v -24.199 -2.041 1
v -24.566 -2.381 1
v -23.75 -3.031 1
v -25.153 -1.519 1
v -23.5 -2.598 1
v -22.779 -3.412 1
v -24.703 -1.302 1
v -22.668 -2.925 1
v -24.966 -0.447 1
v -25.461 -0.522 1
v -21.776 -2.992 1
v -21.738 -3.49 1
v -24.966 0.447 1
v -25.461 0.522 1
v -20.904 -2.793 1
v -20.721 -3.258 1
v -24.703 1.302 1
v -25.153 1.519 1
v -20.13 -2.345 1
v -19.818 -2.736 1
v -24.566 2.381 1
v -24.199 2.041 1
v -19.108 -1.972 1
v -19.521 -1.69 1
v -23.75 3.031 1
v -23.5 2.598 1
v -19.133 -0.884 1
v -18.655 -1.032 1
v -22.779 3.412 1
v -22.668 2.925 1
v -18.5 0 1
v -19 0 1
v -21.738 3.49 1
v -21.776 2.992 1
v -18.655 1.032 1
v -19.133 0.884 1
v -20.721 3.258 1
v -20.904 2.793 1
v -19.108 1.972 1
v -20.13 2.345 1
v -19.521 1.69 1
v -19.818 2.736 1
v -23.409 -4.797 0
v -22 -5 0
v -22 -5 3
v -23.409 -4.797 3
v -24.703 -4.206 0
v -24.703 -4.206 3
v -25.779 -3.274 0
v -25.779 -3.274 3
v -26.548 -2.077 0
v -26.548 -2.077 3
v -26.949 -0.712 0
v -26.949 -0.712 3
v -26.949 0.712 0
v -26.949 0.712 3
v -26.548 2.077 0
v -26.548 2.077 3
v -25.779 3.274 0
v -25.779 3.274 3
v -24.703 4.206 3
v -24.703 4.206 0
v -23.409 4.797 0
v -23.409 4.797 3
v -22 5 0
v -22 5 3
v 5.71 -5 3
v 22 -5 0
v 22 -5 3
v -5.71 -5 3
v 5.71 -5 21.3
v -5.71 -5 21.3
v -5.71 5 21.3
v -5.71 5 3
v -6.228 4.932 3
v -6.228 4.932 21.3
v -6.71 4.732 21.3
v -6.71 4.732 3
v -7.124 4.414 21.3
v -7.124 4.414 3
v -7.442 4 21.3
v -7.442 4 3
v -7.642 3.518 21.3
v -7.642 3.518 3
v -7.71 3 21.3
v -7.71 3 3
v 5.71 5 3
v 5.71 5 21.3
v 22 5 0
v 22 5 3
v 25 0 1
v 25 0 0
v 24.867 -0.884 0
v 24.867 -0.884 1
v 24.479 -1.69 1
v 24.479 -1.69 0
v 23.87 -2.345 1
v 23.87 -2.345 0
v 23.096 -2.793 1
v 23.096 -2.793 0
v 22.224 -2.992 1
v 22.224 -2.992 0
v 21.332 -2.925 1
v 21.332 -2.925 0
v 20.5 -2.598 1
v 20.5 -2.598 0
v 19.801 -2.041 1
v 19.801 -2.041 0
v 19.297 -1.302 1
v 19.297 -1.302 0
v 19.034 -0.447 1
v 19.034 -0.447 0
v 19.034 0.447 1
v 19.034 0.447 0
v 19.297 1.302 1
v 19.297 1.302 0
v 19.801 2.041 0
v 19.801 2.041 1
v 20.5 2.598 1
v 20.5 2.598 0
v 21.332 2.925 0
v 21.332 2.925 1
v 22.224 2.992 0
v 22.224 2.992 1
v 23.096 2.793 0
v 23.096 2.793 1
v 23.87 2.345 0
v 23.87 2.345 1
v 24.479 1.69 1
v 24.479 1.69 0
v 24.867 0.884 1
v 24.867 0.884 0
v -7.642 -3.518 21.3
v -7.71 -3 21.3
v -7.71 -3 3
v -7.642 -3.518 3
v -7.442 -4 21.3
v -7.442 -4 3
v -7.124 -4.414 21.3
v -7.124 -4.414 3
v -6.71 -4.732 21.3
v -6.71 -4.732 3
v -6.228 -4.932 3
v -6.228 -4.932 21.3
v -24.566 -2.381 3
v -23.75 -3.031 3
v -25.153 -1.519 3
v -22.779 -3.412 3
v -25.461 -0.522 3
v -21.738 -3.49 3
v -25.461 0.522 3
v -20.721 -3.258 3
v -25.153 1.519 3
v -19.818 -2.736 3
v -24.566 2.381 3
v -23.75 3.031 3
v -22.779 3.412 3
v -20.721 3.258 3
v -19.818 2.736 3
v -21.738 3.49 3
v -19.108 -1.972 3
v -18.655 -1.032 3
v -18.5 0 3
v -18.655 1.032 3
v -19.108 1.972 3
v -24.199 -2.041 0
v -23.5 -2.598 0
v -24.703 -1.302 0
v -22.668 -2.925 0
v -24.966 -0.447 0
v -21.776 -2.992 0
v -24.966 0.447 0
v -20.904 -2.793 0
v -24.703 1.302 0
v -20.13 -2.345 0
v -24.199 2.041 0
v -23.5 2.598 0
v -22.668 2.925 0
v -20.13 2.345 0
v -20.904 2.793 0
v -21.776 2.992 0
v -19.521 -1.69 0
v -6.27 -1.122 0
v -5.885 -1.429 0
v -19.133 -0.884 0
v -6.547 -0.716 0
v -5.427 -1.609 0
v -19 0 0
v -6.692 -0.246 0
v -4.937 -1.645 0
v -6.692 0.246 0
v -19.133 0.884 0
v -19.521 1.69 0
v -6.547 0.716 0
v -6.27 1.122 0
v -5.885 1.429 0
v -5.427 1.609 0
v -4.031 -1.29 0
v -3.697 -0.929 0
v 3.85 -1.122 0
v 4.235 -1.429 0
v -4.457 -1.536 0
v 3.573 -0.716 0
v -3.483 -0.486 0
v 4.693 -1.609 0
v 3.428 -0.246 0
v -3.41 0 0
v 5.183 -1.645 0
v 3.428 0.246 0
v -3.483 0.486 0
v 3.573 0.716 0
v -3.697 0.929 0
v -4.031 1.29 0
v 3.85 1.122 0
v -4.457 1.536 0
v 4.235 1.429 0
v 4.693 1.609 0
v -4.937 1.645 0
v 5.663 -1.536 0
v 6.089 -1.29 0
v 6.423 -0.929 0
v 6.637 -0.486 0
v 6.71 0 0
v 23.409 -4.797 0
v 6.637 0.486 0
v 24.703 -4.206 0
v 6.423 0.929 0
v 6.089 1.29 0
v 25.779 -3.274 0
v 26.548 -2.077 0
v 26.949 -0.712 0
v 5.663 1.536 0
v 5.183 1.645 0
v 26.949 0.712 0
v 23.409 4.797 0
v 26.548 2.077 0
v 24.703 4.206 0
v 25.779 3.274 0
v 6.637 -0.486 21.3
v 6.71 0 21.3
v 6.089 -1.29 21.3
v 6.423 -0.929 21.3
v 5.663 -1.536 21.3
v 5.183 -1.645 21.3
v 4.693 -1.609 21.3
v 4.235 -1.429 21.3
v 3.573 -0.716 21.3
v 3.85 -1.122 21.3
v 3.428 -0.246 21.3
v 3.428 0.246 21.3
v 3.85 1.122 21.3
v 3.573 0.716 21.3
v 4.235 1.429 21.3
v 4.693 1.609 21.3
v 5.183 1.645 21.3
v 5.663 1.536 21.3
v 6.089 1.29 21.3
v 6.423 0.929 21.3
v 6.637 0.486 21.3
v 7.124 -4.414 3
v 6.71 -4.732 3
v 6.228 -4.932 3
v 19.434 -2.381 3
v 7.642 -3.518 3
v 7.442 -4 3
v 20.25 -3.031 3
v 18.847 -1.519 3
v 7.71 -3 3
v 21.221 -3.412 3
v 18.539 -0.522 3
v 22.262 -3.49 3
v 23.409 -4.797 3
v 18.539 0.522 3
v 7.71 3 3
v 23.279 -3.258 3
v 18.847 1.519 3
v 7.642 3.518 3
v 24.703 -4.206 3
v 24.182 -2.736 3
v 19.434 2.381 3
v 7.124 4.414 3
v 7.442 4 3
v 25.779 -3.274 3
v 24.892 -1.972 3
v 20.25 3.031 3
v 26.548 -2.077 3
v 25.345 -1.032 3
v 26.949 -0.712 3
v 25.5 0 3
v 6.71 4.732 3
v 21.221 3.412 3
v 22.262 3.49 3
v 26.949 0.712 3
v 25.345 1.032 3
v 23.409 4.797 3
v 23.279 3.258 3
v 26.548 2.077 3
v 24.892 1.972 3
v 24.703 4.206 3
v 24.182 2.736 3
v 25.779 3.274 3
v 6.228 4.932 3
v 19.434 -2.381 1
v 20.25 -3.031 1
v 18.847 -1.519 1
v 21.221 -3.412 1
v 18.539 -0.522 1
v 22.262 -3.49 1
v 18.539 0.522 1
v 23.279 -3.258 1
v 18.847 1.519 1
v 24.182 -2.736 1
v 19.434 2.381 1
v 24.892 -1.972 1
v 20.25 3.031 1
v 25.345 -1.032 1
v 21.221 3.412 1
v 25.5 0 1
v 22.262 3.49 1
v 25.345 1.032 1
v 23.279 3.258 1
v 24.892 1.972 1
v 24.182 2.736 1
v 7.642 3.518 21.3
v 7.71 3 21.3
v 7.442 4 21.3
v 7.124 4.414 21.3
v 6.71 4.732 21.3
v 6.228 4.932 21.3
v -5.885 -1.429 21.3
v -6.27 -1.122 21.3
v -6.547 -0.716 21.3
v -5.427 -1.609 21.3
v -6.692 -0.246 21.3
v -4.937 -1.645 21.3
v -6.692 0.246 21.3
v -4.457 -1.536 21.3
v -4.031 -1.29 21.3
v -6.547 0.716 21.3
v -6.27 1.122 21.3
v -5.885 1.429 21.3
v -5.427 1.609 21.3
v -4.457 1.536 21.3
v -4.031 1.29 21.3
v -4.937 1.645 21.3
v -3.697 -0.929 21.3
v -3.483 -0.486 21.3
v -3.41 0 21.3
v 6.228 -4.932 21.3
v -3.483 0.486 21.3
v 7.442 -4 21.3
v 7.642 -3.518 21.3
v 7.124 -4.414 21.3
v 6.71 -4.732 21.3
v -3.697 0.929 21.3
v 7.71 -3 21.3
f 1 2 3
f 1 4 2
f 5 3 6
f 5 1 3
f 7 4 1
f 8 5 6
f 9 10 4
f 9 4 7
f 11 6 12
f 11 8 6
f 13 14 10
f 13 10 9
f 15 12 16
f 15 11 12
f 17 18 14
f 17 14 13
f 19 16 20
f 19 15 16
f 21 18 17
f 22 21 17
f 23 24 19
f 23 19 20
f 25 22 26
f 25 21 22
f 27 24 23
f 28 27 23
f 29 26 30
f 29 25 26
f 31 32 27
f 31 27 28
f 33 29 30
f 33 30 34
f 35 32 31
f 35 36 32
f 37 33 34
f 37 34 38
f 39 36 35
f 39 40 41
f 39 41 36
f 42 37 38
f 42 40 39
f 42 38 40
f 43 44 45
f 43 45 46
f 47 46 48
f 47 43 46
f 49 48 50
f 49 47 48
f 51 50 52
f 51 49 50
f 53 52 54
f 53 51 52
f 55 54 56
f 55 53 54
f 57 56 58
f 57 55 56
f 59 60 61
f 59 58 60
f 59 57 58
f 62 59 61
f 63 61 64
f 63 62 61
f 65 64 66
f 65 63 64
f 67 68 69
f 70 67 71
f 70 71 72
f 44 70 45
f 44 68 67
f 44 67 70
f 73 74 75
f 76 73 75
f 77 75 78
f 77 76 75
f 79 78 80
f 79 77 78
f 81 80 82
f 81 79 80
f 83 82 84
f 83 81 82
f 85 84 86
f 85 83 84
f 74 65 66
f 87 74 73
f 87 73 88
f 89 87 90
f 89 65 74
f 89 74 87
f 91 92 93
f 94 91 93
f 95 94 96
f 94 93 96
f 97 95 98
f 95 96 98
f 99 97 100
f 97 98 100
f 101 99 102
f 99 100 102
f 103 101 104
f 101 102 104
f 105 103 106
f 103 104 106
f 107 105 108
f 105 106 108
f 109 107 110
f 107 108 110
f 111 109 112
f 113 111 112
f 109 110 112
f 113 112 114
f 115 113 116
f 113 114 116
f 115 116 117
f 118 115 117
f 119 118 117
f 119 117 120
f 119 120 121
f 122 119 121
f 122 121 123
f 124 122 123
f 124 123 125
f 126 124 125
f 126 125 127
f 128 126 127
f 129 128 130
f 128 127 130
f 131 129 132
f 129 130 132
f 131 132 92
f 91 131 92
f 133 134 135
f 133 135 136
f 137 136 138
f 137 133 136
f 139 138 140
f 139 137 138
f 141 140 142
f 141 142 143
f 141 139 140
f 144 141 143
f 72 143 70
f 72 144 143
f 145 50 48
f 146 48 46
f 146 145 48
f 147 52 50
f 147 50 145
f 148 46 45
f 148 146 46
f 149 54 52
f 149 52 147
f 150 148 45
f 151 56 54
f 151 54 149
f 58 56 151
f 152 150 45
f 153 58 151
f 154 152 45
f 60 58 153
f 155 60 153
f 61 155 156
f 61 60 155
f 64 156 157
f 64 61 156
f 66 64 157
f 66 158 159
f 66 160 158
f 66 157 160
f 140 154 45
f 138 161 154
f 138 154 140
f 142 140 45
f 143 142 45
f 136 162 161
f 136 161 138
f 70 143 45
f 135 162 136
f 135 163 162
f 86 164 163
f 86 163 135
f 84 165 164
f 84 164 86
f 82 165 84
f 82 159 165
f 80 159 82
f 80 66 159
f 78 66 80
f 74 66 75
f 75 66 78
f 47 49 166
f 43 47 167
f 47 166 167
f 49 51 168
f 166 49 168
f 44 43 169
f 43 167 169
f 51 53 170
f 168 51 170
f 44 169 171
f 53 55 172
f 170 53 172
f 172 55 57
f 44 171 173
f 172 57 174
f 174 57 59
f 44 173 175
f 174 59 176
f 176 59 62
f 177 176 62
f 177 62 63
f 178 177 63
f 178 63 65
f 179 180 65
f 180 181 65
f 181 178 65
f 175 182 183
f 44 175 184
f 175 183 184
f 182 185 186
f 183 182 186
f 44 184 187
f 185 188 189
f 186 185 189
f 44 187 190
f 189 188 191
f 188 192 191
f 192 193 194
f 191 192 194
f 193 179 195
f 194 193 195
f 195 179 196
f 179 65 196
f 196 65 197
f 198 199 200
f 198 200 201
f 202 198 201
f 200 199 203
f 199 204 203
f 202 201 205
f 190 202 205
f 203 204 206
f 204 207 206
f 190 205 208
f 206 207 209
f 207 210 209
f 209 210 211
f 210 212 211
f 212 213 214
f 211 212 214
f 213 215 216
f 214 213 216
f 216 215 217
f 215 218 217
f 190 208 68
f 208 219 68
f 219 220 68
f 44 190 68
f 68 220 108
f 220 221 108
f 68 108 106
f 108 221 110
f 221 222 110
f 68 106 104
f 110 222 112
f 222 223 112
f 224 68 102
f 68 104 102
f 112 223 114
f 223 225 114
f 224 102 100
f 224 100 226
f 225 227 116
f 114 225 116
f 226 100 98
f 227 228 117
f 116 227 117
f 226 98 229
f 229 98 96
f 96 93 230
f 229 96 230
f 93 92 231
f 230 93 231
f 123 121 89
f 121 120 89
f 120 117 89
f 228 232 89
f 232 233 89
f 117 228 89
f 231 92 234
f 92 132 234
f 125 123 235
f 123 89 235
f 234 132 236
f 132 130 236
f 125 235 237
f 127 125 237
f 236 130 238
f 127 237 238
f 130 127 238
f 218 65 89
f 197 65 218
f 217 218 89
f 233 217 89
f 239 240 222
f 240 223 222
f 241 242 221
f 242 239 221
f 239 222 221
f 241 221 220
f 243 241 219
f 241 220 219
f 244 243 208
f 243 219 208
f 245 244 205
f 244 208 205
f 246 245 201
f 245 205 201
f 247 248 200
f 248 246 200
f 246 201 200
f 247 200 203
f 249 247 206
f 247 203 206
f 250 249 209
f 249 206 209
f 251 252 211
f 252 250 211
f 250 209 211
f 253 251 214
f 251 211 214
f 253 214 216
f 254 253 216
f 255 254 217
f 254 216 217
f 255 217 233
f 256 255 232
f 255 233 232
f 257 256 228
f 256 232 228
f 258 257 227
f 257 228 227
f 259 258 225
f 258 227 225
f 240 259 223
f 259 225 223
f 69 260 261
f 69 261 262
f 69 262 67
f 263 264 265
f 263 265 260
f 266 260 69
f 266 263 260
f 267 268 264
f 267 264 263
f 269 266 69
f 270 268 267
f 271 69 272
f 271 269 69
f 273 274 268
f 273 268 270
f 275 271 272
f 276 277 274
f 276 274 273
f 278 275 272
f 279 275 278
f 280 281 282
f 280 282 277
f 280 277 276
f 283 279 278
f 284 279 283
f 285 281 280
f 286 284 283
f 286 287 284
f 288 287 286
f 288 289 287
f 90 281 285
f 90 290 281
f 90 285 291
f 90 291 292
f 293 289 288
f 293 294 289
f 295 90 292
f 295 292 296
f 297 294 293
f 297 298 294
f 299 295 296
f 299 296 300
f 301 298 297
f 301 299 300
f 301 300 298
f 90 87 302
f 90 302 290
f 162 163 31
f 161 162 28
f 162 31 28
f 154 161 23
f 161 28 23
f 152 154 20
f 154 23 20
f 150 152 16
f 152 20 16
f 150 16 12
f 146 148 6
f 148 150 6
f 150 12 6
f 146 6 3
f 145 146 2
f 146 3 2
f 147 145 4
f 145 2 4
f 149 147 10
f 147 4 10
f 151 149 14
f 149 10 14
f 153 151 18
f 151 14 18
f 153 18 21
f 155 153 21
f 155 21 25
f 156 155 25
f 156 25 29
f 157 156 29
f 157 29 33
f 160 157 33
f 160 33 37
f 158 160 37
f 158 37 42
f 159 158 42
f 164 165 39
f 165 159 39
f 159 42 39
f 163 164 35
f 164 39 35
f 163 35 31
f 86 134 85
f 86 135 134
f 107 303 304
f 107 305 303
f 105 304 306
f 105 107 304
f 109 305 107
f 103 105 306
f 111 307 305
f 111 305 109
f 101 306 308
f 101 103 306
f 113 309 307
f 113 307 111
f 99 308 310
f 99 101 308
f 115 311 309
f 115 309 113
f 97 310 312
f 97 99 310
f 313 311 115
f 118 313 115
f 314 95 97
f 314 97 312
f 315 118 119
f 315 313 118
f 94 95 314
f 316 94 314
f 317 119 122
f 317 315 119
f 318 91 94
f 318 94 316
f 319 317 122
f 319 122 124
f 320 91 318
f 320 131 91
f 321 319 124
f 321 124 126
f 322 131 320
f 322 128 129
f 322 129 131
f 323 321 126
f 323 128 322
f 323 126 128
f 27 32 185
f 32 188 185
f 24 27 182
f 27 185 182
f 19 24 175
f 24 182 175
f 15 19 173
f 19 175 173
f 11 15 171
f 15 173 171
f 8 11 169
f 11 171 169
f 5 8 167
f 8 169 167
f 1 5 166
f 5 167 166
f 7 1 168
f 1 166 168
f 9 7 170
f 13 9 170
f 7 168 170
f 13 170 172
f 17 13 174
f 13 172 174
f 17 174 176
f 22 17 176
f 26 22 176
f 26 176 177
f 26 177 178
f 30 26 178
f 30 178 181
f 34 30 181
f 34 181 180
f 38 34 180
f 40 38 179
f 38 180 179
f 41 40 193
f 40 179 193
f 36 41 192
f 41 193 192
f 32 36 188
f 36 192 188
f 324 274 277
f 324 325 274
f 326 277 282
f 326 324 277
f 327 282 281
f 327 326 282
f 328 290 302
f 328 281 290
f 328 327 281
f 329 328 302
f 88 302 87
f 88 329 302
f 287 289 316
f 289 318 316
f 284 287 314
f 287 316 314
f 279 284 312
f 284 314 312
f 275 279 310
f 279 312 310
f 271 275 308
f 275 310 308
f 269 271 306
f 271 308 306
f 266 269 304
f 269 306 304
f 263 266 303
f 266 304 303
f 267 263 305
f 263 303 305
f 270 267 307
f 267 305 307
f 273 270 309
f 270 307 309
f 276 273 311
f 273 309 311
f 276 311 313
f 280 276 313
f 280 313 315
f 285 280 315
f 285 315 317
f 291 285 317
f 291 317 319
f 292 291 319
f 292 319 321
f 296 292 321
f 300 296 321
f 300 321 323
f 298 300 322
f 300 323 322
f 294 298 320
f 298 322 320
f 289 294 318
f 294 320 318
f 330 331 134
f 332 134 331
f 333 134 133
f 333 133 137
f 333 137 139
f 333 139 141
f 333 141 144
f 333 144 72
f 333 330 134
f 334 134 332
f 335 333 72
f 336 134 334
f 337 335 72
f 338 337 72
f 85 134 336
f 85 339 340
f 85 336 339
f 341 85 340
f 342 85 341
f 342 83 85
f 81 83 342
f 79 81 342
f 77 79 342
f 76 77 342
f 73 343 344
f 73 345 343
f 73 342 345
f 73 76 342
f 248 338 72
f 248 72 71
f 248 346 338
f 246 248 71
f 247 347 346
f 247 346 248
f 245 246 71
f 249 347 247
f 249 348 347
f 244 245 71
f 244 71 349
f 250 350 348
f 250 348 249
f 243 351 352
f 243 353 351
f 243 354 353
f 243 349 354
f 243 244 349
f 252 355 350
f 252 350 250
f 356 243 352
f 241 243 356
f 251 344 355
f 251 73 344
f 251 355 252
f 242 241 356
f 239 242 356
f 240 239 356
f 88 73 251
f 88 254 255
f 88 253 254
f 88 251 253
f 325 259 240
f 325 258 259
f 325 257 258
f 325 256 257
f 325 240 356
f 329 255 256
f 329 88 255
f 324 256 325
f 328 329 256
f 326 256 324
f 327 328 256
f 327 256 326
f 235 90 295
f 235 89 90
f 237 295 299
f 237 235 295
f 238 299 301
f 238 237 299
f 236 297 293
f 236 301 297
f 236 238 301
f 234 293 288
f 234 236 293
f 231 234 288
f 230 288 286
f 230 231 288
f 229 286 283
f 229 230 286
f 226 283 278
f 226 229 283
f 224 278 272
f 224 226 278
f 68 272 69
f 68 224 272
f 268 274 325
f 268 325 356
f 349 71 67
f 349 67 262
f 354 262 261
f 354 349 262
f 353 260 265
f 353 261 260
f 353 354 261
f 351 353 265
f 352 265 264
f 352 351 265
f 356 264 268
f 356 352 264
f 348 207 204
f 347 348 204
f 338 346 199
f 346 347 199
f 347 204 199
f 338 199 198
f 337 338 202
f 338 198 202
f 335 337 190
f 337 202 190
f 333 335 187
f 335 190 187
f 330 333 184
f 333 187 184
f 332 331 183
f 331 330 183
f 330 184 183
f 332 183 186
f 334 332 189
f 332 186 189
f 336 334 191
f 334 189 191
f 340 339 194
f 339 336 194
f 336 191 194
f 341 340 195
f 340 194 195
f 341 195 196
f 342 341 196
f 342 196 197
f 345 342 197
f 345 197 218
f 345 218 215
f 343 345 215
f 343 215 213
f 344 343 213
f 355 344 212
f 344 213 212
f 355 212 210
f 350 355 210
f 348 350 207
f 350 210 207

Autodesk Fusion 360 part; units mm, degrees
sketch "Skizze1" plane through (0, 0, 0) normal (0, 0, 1) x (1, 0, 0)
  line L0 (-22, 5) -> (22, 5)
  line L1 (22, 5) -> (22, -5)
  line L2 (22, -5) -> (-22, -5)
  line L3 (-22, -5) -> (-22, 5)
  circle A0 centre (-22, 0) radius 3.5
  circle A1 centre (22, 0) radius 3.5
  circle A2 centre (-22, 0) radius 5
  circle A3 centre (22, 0) radius 5
  line L4 (-13.5, 5) -> (13.5, 5)
  line L5 (13.5, -5) -> (-13.5, -5)
  circle A4 centre (-22, 0) radius 3
  circle A5 centre (22, 0) radius 3
  circle A6 centre (-5.06, 0) radius 1.65
  circle A7 centre (5.06, 0) radius 1.65
  line L6 (-7.71, 5) -> (7.71, 5)
  line L7 (7.71, -5) -> (-7.71, -5)
  line L8 (-7.71, 5) -> (7.71, 5)
  line L9 (7.71, 5) -> (7.71, -5)
  line L10 (7.71, -5) -> (-7.71, -5)
  line L11 (-7.71, -5) -> (-7.71, 5)
  dimension "d1" = 44
  dimension "d2" = 22
  dimension "d3" = 10
  dimension "d4" = 5
  dimension "d5" = 7
  dimension "d6" = 7
  dimension "d7" = 10
  dimension "d8" = 10
  dimension "d11" = 10
  dimension "d12" = 0
  dimension "d18" = 6
  dimension "d19" = 6
  dimension "d22" = 3.3
  dimension "d23" = 3.3
  dimension "d28" = 10
  dimension "d35" = 15.42
  dimension "d36" = 10
  dimension "d37" = 14.29
  dimension "d40" = 2.65
  dimension "d41" = 2.65
extrude "Extrusion1" add sketch "Skizze1" along normal blind 3 contours L3 A0 A2 | L0 L2 A2 L4 L5 L11 | L3 A0 A2 | L0 L2 L4 L5 L6 L7 L8 L9 L10 L11 | L0 L2 A3 L4 L5 L9 | L1 A1 A3 | L1 A1 A3
extrude "Extrusion3" add sketch "Skizze1" along normal blind 1 contours L3 A0 A4 | L3 A0 A4 | L1 A1 A5 | L1 A1 A5
extrude "Extrusion6" add sketch "Skizze1" along normal blind 18.3 from surface at 3 contours L0 L2 L4 L5 L6 L7 L8 L9 L10 L11
fillet "Abrundung1" radius 2 4 edges at (7.71, 5, 12.15) (-7.71, 5, 12.15) (-7.71, -5, 12.15) (7.71, -5, 12.15)
equation "d2 = d1 / 2"
equation "d4 = d3 / 2"
equation "d6 = d5"
equation "d7 = d3"
equation "d8 = d7"
equation "d11 = d3"
equation "d12 = ( d3 - d11 ) / 2"
equation "d18 = d5 - 1 mm"
equation "d19 = d18"
equation "d23 = d22"
equation "d24 = d31 / 2"
equation "d28 = d11"
equation "d29 = 15.22 mm + 0.2 mm"
equation "d31 = 5.79 mm"
equation "d35 = 15.22 mm + 0.2 mm"
equation "d36 = d11"
equation "d37 = ( d1 - d29 ) / 2"
equation "d40 = d41"
equation "d41 = 1.00 mm + d22 / 2"
equation "d43 = 20.3 mm - 3 mm + 1 mm"
